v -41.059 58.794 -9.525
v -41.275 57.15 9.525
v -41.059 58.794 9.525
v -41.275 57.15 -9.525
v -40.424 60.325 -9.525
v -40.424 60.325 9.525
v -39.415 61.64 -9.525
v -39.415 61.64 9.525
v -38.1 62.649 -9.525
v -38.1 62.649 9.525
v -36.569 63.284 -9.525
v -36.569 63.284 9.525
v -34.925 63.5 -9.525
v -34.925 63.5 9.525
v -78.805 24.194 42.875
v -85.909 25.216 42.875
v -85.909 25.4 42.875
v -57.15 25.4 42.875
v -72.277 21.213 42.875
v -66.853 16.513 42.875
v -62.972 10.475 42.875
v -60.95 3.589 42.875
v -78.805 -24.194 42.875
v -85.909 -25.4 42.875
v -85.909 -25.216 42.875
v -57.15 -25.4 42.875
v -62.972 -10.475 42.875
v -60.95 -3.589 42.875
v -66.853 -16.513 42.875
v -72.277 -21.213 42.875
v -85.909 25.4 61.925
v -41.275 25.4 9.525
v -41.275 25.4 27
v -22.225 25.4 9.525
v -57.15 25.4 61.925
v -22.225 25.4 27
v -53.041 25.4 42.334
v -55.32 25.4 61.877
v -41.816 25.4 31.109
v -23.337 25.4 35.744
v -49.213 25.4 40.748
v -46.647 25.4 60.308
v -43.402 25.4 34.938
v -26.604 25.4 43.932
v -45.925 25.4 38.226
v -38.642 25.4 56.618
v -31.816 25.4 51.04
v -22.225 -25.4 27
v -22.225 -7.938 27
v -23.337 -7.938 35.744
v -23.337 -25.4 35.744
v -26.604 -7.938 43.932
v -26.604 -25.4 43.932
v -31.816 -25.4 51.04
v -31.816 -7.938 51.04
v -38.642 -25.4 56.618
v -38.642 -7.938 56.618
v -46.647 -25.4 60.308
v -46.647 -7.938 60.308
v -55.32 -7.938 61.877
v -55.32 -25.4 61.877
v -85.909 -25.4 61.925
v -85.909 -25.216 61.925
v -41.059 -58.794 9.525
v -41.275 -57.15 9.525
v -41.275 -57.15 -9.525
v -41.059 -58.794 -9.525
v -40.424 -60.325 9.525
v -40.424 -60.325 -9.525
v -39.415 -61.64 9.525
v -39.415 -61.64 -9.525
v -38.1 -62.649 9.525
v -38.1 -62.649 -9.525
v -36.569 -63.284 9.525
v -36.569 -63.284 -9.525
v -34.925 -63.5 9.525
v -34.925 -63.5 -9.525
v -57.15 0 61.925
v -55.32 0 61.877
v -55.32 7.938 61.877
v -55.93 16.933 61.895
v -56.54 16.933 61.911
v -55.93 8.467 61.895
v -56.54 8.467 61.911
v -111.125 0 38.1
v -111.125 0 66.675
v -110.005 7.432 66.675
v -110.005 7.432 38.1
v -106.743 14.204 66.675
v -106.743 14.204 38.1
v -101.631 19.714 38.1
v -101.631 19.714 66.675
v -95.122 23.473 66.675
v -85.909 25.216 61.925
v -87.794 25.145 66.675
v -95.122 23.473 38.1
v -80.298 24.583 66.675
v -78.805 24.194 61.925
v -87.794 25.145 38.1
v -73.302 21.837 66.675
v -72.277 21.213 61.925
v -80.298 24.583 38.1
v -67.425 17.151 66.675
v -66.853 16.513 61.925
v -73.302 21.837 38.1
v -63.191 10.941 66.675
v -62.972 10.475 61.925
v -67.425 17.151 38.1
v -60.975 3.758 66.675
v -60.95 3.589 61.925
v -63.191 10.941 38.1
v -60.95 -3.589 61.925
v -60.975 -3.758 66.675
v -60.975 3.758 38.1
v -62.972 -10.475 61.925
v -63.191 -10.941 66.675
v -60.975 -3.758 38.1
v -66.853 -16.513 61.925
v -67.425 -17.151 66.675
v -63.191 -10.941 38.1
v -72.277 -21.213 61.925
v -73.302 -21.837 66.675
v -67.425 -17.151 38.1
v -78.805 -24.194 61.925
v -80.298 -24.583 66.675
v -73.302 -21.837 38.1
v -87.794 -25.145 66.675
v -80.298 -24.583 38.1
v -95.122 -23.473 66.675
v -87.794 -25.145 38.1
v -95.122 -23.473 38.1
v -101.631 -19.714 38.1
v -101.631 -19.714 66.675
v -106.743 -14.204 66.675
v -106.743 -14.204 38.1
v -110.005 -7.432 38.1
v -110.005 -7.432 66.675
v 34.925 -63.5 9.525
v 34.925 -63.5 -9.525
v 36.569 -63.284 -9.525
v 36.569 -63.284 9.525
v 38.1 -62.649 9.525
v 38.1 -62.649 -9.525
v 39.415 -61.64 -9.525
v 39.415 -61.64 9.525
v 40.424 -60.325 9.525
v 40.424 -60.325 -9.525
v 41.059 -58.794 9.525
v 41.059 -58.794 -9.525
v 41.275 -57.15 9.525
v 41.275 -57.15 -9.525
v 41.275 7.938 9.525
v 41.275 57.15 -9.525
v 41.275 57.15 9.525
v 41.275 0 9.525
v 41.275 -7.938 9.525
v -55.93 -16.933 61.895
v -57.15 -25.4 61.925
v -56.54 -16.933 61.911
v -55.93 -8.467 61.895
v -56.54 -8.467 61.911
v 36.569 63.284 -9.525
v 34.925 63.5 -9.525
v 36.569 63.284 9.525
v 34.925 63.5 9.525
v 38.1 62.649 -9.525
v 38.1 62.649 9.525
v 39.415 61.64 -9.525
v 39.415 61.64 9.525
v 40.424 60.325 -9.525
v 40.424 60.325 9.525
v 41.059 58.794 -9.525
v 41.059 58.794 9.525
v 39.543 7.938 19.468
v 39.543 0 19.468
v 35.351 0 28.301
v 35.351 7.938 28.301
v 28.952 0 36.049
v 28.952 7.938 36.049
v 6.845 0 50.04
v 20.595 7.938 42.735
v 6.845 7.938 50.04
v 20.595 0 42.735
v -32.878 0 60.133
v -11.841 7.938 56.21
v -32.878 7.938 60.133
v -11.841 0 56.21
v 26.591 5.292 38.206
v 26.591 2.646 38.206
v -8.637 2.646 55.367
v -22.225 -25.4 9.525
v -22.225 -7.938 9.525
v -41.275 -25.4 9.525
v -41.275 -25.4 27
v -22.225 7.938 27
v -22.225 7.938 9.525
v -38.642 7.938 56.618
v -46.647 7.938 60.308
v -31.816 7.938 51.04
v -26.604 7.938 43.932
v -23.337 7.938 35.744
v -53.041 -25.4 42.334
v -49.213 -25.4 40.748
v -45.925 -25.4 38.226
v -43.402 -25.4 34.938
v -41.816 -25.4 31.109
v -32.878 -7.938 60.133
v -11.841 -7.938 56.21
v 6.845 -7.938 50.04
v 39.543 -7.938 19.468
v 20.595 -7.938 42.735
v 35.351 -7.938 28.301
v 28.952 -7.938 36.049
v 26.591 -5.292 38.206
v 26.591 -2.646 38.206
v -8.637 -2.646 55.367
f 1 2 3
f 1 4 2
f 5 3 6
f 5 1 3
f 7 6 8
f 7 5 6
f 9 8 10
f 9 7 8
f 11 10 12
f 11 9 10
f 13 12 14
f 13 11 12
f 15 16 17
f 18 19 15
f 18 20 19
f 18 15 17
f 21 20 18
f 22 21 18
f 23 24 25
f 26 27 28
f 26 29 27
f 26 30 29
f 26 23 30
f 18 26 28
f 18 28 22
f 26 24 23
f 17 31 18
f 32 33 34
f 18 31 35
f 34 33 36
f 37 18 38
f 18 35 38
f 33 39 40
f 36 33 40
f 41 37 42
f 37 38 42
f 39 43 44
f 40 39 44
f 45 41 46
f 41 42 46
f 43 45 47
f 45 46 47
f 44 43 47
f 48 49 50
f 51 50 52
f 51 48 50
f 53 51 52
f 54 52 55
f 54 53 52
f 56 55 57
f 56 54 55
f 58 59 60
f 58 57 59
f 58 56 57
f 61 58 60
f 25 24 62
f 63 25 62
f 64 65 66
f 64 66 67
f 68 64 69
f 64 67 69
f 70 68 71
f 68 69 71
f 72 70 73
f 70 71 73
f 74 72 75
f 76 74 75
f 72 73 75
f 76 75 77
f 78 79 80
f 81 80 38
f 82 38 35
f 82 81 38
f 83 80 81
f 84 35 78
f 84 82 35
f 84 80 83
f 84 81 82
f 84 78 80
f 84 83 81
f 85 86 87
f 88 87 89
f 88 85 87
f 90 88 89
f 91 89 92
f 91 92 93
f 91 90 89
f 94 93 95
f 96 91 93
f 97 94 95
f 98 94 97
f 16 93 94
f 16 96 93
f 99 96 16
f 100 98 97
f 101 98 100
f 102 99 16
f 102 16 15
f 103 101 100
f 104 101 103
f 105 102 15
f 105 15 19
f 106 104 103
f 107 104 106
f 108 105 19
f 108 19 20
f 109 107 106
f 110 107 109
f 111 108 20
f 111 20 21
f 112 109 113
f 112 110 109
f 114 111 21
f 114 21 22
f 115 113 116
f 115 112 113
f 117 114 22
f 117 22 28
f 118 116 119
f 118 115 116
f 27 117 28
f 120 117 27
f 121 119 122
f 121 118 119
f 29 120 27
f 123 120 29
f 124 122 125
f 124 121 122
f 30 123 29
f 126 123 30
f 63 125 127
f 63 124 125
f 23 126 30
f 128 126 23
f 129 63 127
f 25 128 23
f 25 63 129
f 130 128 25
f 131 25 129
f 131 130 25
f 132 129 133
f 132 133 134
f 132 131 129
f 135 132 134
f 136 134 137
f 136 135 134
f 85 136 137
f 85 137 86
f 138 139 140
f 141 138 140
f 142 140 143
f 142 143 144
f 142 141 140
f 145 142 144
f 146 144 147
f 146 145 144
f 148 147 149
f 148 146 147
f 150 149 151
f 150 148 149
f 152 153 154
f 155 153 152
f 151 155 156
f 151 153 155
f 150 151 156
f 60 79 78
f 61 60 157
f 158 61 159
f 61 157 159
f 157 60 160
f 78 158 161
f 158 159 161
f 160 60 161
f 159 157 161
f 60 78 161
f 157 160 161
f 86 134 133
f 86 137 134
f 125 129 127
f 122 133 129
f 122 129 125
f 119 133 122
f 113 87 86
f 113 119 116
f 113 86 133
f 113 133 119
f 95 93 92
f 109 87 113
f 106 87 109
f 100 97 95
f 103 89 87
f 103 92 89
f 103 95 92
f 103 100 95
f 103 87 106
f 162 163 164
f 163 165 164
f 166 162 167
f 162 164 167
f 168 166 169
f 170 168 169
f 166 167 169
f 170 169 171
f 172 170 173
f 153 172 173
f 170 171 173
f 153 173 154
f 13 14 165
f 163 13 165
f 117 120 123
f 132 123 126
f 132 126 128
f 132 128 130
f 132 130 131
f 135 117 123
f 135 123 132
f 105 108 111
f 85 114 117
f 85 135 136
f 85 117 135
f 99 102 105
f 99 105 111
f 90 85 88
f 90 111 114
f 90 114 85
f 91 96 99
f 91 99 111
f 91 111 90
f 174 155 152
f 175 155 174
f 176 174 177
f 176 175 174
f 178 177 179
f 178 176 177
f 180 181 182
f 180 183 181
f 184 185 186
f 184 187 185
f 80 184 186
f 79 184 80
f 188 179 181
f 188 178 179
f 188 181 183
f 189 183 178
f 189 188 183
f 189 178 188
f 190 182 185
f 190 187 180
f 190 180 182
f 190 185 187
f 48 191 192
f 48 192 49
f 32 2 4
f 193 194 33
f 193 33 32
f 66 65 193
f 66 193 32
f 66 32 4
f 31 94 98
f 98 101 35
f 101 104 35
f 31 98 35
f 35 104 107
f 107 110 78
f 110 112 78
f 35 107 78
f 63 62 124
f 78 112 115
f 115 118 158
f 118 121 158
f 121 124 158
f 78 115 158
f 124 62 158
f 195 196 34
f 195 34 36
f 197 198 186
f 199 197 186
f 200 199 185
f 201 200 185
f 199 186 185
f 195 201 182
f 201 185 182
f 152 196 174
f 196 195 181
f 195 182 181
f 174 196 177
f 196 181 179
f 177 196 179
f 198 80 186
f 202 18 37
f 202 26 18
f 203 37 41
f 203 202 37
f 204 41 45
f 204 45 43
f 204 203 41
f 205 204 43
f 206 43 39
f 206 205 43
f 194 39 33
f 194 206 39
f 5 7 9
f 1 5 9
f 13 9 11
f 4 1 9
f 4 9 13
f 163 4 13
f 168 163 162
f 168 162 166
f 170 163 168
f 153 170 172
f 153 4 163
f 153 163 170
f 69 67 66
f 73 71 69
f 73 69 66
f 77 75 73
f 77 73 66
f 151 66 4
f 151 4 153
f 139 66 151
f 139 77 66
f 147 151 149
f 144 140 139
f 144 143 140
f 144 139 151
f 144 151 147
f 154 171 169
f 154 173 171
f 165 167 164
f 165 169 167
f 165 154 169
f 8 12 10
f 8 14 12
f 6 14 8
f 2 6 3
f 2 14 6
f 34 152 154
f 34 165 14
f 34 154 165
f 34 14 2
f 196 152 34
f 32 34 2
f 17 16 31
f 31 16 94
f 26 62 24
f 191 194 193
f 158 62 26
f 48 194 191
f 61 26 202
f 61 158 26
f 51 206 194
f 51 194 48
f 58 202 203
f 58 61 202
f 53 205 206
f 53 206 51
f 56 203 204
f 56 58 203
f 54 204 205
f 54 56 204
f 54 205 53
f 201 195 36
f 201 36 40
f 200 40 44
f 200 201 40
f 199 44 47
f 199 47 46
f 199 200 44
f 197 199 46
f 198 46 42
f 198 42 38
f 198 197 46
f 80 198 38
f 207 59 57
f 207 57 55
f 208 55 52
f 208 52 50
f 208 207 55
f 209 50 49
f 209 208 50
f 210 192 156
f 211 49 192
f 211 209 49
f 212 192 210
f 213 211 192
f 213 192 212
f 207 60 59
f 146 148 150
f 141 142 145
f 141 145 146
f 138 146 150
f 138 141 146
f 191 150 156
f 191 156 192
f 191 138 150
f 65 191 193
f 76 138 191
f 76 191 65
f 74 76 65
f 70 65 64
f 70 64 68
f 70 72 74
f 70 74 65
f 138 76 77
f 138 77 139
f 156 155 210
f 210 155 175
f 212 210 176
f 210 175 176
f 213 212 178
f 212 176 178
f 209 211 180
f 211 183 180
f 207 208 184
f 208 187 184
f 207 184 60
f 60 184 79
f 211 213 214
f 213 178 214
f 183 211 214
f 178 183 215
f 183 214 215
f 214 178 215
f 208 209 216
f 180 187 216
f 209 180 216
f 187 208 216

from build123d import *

# Parameters (mm, degrees)
F1_DEPTH = 63.5
F2_DEPTH = 25.4
F3_DEPTH = 7.9375
F0_W     = 25.5843524362
F0_H     = 19.05
F4_DEPTH = 25.4
F6_R     = 6.35


with BuildPart() as f1:
    # F0 (on Front) → F1 (new body, symmetric)
    with BuildSketch(Plane.XZ):
        Polygon((41.275, -9.525), (41.275, 9.525), (-22.225, 9.525), (-41.275, 9.525), (-41.275, -9.525), align=None)
    extrude(amount=F1_DEPTH, both=True)

    # F0 (on Front) → F2 (join, symmetric)
    with BuildSketch(Plane.XZ):
        with BuildLine():
            Line((-41.275, 9.525), (-22.225, 9.525))
            Line((-22.225, 9.525), (-22.225, 27.0002))
            ThreePointArc((-22.225, 27.0002), (-31.815718959, 51.0403711544), (-55.3204805517, 61.8772480917))
            add(Edge.make_bspline(
                [(-55.3204805517, 61.8772480917), (-55.929805309, 61.8954627703), (-56.5396707352, 61.9114442844), (-57.15, 61.9252)],
                knots=[110.1454497183, 110.1454497183, 110.1454497183, 110.1454497183, 111.5045361635, 111.5045361635, 111.5045361635, 111.5045361635], degree=3))
            Line((-57.15, 61.9252), (-60.325, 61.9252))
            Line((-60.325, 61.9252), (-60.325, 42.8752))
            Line((-60.325, 42.8752), (-57.15, 42.8752))
            ThreePointArc((-57.15, 42.8752), (-45.9246798487, 38.2255201513), (-41.275, 27.0002))
            Line((-41.275, 27.0002), (-41.275, 9.525))
        make_face()
    extrude(amount=F2_DEPTH, both=True)

    # F0 (on Front) → F3 (join, symmetric)
    with BuildSketch(Plane.XZ):
        with BuildLine():
            Line((-22.225, 9.525), (41.275, 9.525))
            add(Edge.make_bspline(
                [(41.275, 9.525), (39.8922745283, 44.2572563943), (-5.9385227977, 60.4010623985), (-55.3204805517, 61.8772480917)],
                knots=[0, 0, 0, 0, 110.1454497183, 110.1454497183, 110.1454497183, 110.1454497183], degree=3))
            ThreePointArc((-55.3204805517, 61.8772480917), (-31.815718959, 51.0403711544), (-22.225, 27.0002))
            Line((-22.225, 27.0002), (-22.225, 9.525))
        make_face()
    extrude(amount=F3_DEPTH, both=True)

    # F0 (on Front) → F4 (join, symmetric)
    with BuildSketch(Plane.XZ):
        with Locations((-73.1171762181, 52.4002)):
            Rectangle(F0_W, F0_H)
    extrude(amount=F4_DEPTH, both=True)

    # F0 (on Front) → F5 (revolve)
    with BuildSketch(Plane.XZ):
        Polygon((-85.9093524362, 42.8752), (-85.9093524362, 61.9252), (-85.9093524362, 66.675), (-111.125, 66.675), (-111.125, 38.1), (-85.9093524362, 38.1), align=None)
    revolve(axis=Axis((-85.9093524362, 0, 52.3875), (0, 0, -1)))

    # F6
    f6_edges = [f1.edges().sort_by_distance(p)[0] for p in [
        (41.275, 63.5, 0),
        (-41.275, 63.5, 0),
        (-41.275, -63.5, 0),
        (41.275, -63.5, 0),
    ]]
    fillet(f6_edges, radius=F6_R)


solid = f1.part
